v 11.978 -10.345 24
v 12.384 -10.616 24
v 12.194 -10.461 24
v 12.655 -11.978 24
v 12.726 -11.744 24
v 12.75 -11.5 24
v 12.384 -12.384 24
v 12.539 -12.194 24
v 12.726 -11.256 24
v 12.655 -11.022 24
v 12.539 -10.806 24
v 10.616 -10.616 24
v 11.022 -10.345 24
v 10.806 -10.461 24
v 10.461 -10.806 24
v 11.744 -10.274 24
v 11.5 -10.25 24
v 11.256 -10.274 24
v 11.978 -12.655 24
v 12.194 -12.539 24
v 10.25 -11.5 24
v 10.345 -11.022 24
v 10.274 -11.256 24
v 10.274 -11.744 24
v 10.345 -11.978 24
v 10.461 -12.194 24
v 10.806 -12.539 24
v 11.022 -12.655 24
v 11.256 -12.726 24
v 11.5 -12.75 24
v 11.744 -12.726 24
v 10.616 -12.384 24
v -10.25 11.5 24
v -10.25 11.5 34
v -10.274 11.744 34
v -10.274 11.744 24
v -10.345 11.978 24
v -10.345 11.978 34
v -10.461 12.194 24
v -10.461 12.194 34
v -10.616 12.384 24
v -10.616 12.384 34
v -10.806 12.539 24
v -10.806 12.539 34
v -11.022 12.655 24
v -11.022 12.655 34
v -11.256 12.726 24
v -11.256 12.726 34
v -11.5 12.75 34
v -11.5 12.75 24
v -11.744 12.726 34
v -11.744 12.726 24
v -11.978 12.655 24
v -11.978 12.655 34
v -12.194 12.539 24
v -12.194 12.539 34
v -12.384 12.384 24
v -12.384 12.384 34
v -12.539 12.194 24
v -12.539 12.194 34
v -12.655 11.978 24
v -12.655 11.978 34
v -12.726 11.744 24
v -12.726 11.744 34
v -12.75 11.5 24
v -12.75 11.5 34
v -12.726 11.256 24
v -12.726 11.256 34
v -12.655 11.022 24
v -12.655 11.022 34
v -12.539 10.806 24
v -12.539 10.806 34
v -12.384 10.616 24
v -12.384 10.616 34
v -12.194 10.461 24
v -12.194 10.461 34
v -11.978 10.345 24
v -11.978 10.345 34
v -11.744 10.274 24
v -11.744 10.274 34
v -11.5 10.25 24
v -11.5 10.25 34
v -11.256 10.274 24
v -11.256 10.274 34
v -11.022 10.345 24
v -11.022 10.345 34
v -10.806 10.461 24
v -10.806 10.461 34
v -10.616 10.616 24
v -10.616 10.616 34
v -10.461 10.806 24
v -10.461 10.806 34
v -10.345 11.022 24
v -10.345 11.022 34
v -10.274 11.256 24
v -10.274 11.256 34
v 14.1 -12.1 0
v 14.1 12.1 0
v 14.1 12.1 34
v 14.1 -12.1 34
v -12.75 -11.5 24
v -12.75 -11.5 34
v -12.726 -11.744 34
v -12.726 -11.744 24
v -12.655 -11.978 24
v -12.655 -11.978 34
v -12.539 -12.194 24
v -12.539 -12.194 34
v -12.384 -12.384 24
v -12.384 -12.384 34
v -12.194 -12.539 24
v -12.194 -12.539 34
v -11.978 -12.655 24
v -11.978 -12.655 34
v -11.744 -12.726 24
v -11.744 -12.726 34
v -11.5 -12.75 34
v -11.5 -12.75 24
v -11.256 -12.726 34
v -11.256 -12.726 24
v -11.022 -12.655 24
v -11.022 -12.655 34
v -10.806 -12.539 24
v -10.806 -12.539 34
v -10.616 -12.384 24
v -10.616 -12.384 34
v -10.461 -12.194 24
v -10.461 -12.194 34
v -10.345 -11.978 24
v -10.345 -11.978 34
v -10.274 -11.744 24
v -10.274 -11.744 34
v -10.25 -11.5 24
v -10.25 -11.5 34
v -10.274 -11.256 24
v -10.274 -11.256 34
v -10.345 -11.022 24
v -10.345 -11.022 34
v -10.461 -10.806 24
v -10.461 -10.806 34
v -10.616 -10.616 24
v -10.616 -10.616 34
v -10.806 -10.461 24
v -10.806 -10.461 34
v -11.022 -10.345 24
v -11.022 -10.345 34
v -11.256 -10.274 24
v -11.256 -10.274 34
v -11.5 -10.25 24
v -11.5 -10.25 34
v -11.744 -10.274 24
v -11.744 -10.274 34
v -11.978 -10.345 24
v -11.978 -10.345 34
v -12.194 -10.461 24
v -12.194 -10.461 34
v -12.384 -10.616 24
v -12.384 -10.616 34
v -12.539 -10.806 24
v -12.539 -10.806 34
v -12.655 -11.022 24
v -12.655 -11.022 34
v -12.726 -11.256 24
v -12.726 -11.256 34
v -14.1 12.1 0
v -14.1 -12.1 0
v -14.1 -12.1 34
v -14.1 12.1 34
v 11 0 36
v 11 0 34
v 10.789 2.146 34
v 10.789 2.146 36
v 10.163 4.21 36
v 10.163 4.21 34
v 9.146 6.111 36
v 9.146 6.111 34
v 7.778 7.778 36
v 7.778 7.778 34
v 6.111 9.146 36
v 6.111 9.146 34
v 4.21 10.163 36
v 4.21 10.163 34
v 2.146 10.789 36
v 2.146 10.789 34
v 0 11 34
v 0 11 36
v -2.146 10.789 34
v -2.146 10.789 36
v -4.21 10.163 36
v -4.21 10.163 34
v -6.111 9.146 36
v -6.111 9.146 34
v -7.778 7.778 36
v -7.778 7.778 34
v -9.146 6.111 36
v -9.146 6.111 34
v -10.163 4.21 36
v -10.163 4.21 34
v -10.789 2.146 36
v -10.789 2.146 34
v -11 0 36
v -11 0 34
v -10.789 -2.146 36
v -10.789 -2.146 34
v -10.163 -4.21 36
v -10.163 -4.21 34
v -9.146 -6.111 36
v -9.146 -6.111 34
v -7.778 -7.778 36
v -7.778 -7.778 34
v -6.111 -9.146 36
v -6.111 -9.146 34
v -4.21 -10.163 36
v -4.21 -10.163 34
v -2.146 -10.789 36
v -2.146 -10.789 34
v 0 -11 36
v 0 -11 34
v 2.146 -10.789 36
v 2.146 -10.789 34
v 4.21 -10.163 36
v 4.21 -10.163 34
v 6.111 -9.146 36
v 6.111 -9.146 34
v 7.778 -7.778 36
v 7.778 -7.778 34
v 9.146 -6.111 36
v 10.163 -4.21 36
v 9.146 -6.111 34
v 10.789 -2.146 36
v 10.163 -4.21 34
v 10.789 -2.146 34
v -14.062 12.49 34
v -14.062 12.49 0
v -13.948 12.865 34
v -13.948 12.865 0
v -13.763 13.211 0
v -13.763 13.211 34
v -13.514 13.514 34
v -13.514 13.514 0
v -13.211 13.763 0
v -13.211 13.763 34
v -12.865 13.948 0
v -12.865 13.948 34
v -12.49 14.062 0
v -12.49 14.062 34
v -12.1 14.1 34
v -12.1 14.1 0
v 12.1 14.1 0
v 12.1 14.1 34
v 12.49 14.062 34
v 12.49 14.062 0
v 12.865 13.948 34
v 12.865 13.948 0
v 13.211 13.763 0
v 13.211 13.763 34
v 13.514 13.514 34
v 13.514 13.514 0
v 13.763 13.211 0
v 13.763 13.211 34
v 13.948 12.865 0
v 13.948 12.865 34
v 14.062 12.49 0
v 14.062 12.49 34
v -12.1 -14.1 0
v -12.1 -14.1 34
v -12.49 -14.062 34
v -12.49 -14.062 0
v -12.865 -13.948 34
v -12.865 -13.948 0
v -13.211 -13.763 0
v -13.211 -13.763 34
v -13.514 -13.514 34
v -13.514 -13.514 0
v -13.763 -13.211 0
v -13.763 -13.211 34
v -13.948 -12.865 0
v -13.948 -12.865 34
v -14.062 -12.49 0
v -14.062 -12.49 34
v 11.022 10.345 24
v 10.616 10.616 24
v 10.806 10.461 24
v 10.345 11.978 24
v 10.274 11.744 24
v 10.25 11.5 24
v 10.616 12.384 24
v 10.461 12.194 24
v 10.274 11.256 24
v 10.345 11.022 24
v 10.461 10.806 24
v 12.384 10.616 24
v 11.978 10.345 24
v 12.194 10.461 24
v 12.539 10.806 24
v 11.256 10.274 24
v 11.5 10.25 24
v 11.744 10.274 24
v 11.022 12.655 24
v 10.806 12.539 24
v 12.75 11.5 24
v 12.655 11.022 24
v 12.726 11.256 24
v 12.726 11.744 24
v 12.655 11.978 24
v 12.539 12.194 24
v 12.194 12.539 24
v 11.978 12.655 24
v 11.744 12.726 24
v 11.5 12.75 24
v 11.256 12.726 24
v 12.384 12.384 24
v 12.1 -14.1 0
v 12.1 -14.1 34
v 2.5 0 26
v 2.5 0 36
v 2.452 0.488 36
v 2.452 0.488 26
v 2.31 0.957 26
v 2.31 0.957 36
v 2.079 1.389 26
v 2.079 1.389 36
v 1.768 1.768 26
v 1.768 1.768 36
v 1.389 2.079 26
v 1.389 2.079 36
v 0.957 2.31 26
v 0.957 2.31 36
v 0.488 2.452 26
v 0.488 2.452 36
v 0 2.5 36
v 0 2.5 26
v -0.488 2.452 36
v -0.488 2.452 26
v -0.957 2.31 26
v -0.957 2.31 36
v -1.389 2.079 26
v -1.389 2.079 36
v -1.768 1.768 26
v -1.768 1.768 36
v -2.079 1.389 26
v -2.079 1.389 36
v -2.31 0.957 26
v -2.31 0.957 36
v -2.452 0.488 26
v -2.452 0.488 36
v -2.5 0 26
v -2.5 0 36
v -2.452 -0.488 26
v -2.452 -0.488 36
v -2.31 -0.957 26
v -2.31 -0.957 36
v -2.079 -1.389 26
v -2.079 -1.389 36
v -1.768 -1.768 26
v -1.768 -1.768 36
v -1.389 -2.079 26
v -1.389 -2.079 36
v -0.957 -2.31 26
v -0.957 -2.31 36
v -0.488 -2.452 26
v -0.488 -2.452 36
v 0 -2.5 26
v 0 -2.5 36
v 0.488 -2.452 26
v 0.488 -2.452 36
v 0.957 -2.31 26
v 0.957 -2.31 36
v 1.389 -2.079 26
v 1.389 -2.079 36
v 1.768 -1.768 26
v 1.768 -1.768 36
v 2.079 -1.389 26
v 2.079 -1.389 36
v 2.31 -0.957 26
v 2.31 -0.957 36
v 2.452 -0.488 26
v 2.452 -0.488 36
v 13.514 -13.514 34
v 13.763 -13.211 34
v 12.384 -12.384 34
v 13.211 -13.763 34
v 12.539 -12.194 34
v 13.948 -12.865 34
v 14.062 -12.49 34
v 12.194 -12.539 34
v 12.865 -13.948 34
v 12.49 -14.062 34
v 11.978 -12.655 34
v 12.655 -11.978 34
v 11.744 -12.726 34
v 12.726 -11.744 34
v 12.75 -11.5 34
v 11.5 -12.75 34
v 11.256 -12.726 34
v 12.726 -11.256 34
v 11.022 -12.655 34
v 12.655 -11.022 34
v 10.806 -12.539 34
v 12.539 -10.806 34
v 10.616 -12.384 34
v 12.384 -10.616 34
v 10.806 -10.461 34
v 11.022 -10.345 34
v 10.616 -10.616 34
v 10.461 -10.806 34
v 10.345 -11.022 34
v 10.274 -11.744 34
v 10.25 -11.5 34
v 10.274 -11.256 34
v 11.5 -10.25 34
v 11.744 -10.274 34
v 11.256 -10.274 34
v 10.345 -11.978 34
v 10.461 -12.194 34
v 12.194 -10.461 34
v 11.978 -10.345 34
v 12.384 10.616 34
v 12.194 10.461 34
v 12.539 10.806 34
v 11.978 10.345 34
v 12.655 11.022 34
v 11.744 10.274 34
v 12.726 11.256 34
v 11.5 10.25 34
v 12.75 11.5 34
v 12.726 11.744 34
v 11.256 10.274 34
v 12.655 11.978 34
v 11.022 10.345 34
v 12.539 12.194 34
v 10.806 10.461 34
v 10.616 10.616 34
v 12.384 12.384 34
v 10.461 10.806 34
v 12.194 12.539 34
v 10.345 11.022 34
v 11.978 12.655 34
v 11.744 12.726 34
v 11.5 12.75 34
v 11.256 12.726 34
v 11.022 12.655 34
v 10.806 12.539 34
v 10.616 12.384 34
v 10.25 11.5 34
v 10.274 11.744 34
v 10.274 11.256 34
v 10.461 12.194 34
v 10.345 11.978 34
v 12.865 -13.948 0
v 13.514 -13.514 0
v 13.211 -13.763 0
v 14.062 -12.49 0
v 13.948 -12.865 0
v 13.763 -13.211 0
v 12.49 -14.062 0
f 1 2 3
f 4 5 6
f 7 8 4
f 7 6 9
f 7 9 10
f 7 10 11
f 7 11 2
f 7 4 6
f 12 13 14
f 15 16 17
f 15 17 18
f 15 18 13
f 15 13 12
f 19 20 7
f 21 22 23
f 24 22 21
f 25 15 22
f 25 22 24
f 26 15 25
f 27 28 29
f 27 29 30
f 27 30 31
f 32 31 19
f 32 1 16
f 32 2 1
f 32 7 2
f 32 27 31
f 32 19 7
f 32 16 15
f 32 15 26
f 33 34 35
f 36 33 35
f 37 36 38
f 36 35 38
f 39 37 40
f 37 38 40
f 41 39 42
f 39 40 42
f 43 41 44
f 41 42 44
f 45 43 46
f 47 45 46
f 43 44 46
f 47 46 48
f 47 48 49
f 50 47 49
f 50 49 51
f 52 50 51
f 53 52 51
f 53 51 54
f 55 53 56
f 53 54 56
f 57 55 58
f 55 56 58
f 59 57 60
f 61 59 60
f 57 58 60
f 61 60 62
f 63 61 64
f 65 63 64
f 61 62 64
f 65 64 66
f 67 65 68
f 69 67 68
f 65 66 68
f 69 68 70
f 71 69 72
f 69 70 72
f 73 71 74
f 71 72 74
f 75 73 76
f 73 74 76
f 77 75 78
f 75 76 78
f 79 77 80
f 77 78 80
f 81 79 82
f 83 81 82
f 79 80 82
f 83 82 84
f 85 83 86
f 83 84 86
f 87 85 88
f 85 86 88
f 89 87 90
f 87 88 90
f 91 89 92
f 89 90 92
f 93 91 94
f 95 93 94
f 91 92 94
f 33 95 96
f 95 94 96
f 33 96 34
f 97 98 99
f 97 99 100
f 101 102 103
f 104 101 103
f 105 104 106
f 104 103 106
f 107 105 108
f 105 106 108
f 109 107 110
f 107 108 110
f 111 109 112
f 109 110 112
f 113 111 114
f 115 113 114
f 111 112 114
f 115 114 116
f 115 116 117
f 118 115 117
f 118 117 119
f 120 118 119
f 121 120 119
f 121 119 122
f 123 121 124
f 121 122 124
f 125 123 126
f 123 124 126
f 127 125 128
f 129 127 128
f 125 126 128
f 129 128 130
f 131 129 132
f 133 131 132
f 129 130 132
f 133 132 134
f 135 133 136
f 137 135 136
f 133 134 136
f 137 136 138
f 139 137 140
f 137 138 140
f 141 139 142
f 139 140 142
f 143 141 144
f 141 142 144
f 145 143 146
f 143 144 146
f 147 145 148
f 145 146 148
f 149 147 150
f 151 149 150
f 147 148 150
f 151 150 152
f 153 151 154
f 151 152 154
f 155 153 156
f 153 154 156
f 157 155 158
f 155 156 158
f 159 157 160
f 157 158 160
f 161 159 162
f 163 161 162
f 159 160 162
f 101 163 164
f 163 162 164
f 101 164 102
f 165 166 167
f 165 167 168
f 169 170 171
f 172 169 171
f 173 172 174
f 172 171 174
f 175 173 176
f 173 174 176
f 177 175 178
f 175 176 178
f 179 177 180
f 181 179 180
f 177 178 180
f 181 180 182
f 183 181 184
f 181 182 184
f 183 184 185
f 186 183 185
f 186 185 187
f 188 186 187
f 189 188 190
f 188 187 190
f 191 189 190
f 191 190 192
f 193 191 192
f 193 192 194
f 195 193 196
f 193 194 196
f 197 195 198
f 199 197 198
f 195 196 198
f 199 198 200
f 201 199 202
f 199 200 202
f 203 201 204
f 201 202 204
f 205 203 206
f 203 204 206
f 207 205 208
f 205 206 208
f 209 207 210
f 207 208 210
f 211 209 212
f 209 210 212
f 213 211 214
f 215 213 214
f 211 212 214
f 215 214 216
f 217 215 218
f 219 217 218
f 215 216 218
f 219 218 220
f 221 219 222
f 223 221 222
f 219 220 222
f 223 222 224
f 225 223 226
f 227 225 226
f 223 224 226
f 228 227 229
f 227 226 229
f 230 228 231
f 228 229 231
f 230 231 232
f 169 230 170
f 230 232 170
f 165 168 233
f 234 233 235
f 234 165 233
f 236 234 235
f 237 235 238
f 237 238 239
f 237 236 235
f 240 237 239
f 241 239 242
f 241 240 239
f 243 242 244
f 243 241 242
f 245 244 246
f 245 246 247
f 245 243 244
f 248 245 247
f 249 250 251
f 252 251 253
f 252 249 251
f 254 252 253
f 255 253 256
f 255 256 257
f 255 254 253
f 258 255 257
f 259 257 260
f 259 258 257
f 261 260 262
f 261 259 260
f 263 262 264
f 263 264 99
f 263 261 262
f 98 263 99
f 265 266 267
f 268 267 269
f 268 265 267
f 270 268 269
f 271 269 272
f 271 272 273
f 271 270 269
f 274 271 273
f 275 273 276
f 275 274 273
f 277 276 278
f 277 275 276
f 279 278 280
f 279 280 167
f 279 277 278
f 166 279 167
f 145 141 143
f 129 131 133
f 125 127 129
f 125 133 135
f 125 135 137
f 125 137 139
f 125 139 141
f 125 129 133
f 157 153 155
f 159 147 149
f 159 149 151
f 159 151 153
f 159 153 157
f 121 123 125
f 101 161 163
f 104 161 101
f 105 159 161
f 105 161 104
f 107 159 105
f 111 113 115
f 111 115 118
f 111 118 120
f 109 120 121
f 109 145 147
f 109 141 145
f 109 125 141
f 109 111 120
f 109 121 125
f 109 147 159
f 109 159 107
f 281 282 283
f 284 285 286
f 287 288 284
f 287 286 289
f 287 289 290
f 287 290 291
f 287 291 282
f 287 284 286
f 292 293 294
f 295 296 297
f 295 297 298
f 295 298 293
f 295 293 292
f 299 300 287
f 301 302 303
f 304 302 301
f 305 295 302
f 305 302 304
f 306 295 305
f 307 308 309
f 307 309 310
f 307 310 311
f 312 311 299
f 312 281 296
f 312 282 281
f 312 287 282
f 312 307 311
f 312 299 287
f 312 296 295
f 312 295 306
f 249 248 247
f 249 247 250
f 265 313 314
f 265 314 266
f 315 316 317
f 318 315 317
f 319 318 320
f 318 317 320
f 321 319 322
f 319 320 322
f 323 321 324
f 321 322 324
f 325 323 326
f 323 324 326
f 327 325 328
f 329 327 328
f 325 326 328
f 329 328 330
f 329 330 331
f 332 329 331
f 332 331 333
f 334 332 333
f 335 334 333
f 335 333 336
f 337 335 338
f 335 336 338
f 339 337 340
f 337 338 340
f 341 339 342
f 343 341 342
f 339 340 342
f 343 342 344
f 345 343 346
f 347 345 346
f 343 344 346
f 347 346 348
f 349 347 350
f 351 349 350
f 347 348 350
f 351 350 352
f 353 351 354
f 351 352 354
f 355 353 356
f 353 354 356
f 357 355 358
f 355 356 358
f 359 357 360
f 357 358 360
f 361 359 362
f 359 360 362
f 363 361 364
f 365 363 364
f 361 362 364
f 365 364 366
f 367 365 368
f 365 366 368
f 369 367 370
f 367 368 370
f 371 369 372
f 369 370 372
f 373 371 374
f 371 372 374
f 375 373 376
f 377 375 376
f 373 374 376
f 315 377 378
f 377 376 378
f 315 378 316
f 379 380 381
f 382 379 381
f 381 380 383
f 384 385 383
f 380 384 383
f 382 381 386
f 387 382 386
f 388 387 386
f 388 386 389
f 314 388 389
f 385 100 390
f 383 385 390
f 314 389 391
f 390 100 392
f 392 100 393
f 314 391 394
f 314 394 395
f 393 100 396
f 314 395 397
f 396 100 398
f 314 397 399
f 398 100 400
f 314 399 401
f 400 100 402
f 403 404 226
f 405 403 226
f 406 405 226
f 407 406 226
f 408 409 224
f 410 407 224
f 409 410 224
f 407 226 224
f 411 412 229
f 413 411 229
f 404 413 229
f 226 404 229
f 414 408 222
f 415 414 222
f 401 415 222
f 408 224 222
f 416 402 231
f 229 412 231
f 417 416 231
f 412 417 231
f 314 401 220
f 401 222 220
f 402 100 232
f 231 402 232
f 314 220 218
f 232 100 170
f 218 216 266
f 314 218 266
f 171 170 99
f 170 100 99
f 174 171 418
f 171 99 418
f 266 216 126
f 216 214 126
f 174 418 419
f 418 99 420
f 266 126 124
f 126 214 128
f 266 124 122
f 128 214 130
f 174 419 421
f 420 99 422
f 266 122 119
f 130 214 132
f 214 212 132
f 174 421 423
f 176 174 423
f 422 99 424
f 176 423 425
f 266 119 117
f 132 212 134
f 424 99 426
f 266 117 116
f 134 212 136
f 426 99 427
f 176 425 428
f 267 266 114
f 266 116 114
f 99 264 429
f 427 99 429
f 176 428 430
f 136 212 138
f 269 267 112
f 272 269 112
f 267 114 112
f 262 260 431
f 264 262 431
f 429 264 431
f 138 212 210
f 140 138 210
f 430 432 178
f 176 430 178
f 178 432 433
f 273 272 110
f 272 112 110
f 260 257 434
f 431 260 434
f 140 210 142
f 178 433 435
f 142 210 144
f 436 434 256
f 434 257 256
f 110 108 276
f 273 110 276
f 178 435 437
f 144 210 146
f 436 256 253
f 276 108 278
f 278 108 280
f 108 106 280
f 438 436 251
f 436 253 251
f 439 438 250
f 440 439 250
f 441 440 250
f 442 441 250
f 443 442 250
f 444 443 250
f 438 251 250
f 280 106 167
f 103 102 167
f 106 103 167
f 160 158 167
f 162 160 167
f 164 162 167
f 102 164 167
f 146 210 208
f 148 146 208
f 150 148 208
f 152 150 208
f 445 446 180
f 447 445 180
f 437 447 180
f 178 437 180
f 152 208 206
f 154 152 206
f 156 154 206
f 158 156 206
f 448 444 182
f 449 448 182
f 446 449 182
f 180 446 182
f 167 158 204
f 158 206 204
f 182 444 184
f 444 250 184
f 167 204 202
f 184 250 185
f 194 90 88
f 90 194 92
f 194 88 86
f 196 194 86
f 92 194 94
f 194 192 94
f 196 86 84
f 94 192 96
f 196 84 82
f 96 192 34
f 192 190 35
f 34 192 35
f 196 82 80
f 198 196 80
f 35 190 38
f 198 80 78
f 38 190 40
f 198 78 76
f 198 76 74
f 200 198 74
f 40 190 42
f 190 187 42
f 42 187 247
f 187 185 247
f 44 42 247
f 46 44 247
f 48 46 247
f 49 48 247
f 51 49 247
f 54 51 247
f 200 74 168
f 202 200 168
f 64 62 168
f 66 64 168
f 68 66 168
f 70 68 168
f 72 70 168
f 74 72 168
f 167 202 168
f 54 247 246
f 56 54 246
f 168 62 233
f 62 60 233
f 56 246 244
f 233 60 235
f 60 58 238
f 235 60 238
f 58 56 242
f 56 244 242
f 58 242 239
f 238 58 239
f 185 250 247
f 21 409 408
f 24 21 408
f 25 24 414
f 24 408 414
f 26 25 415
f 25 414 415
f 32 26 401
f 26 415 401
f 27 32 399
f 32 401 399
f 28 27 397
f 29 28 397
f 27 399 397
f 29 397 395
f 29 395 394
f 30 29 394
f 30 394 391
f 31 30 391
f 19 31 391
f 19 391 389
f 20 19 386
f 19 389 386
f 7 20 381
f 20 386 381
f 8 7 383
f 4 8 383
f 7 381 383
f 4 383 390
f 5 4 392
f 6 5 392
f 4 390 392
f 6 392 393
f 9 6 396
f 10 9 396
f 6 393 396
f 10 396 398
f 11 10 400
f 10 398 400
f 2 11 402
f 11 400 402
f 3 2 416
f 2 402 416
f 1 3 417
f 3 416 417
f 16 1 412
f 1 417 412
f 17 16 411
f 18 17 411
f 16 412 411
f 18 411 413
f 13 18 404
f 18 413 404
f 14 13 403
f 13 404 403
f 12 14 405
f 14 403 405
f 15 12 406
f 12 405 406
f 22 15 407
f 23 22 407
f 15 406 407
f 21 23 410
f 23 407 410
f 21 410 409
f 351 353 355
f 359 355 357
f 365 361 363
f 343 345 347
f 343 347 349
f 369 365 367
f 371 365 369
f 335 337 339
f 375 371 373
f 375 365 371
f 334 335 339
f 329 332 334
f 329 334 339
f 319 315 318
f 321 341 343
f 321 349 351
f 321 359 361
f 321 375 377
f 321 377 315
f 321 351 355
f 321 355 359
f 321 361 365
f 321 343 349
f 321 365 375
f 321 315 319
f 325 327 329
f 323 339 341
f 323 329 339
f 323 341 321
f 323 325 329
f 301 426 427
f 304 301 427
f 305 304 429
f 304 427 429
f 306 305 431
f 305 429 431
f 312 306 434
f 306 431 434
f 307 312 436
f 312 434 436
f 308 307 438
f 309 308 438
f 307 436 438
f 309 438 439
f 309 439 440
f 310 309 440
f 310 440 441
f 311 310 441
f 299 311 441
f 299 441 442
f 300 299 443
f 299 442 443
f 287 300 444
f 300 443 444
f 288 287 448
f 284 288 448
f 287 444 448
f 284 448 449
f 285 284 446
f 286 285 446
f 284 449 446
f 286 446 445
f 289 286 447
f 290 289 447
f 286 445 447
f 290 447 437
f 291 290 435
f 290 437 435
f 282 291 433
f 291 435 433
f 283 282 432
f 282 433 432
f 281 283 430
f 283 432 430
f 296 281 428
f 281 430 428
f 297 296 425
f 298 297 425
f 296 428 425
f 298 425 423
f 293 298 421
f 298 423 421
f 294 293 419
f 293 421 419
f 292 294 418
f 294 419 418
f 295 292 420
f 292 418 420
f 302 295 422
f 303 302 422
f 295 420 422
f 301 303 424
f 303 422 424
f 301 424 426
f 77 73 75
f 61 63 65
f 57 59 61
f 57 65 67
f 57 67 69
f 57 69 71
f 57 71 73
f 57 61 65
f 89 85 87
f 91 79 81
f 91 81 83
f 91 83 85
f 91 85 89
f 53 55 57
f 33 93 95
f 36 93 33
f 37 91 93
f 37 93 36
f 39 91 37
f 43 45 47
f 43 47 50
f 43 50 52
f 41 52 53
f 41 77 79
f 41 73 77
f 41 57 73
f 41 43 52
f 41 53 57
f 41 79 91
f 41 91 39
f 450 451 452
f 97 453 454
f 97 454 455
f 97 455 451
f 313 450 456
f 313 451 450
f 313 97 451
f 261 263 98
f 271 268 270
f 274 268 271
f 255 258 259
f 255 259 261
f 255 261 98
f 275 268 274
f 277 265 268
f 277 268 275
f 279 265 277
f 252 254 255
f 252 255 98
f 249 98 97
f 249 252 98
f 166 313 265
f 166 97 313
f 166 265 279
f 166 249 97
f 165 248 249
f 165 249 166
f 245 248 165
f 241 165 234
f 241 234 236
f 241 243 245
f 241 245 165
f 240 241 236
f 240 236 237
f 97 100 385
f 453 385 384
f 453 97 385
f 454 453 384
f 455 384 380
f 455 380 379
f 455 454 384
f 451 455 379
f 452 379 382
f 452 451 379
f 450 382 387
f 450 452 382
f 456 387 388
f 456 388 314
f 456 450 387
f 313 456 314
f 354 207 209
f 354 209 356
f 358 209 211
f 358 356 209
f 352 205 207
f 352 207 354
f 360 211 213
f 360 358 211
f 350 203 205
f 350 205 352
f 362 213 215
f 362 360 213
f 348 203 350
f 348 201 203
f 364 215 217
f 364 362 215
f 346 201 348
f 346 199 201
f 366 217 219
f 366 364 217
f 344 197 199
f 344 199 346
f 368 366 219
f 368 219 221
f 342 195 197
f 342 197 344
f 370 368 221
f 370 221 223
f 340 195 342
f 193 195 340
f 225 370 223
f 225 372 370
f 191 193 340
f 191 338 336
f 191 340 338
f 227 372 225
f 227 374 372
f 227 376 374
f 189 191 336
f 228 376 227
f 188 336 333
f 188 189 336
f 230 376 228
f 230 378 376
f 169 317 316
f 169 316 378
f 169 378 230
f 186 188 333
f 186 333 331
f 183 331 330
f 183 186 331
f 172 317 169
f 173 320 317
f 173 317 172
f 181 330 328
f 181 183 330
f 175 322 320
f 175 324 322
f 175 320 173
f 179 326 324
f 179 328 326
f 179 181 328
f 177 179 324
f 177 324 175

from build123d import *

# Parameters (mm, degrees)
BOSS_EXTRUDE1_DEPTH = 34
SKETCH2_R           = 11
BOSS_EXTRUDE2_DEPTH = 2
SKETCH3_R           = 2.5
CUT_EXTRUDE1_DEPTH  = 10
SKETCH4_R           = 1.25
CUT_EXTRUDE2_DEPTH  = 10


with BuildPart() as part:
    # Sketch1 → Boss-Extrude1 (new body)
    with BuildSketch(Plane.XY):
        with BuildLine():
            Line((-12.1, 14.1), (12.1, 14.1))
            ThreePointArc((12.1, 14.1), (13.514213562, 13.514213562), (14.1, 12.1))
            Line((14.1, 12.1), (14.1, -12.1))
            ThreePointArc((14.1, -12.1), (13.514213562, -13.514213562), (12.1, -14.1))
            Line((12.1, -14.1), (-12.1, -14.1))
            ThreePointArc((-12.1, -14.1), (-13.514213562, -13.514213562), (-14.1, -12.1))
            Line((-14.1, -12.1), (-14.1, 12.1))
            ThreePointArc((-14.1, 12.1), (-13.514213562, 13.514213562), (-12.1, 14.1))
        make_face()
    extrude(amount=BOSS_EXTRUDE1_DEPTH)

    # Sketch2 → Boss-Extrude2 (add)
    with BuildSketch(Plane.XY.offset(34)):
        Circle(SKETCH2_R)
    extrude(amount=BOSS_EXTRUDE2_DEPTH)

    # Sketch3 → Cut-Extrude1 (cut)
    with BuildSketch(Plane.XY.offset(36)):
        Circle(SKETCH3_R)
    extrude(amount=-CUT_EXTRUDE1_DEPTH, mode=Mode.SUBTRACT)

    # Sketch4 → Cut-Extrude2 (cut)
    with BuildSketch(Plane.XY.offset(34)):
        with Locations((-11.5, 11.5)):
            Circle(SKETCH4_R)
        with Locations((11.5, 11.5)):
            Circle(SKETCH4_R)
        with Locations(Location((11.5, -11.5, 0), (0, 0, 180))):
            Circle(SKETCH4_R)
        with Locations(Location((-11.5, -11.5, 0), (0, 0, 180))):
            Circle(SKETCH4_R)
    extrude(amount=-CUT_EXTRUDE2_DEPTH, mode=Mode.SUBTRACT)


solid = part.part
